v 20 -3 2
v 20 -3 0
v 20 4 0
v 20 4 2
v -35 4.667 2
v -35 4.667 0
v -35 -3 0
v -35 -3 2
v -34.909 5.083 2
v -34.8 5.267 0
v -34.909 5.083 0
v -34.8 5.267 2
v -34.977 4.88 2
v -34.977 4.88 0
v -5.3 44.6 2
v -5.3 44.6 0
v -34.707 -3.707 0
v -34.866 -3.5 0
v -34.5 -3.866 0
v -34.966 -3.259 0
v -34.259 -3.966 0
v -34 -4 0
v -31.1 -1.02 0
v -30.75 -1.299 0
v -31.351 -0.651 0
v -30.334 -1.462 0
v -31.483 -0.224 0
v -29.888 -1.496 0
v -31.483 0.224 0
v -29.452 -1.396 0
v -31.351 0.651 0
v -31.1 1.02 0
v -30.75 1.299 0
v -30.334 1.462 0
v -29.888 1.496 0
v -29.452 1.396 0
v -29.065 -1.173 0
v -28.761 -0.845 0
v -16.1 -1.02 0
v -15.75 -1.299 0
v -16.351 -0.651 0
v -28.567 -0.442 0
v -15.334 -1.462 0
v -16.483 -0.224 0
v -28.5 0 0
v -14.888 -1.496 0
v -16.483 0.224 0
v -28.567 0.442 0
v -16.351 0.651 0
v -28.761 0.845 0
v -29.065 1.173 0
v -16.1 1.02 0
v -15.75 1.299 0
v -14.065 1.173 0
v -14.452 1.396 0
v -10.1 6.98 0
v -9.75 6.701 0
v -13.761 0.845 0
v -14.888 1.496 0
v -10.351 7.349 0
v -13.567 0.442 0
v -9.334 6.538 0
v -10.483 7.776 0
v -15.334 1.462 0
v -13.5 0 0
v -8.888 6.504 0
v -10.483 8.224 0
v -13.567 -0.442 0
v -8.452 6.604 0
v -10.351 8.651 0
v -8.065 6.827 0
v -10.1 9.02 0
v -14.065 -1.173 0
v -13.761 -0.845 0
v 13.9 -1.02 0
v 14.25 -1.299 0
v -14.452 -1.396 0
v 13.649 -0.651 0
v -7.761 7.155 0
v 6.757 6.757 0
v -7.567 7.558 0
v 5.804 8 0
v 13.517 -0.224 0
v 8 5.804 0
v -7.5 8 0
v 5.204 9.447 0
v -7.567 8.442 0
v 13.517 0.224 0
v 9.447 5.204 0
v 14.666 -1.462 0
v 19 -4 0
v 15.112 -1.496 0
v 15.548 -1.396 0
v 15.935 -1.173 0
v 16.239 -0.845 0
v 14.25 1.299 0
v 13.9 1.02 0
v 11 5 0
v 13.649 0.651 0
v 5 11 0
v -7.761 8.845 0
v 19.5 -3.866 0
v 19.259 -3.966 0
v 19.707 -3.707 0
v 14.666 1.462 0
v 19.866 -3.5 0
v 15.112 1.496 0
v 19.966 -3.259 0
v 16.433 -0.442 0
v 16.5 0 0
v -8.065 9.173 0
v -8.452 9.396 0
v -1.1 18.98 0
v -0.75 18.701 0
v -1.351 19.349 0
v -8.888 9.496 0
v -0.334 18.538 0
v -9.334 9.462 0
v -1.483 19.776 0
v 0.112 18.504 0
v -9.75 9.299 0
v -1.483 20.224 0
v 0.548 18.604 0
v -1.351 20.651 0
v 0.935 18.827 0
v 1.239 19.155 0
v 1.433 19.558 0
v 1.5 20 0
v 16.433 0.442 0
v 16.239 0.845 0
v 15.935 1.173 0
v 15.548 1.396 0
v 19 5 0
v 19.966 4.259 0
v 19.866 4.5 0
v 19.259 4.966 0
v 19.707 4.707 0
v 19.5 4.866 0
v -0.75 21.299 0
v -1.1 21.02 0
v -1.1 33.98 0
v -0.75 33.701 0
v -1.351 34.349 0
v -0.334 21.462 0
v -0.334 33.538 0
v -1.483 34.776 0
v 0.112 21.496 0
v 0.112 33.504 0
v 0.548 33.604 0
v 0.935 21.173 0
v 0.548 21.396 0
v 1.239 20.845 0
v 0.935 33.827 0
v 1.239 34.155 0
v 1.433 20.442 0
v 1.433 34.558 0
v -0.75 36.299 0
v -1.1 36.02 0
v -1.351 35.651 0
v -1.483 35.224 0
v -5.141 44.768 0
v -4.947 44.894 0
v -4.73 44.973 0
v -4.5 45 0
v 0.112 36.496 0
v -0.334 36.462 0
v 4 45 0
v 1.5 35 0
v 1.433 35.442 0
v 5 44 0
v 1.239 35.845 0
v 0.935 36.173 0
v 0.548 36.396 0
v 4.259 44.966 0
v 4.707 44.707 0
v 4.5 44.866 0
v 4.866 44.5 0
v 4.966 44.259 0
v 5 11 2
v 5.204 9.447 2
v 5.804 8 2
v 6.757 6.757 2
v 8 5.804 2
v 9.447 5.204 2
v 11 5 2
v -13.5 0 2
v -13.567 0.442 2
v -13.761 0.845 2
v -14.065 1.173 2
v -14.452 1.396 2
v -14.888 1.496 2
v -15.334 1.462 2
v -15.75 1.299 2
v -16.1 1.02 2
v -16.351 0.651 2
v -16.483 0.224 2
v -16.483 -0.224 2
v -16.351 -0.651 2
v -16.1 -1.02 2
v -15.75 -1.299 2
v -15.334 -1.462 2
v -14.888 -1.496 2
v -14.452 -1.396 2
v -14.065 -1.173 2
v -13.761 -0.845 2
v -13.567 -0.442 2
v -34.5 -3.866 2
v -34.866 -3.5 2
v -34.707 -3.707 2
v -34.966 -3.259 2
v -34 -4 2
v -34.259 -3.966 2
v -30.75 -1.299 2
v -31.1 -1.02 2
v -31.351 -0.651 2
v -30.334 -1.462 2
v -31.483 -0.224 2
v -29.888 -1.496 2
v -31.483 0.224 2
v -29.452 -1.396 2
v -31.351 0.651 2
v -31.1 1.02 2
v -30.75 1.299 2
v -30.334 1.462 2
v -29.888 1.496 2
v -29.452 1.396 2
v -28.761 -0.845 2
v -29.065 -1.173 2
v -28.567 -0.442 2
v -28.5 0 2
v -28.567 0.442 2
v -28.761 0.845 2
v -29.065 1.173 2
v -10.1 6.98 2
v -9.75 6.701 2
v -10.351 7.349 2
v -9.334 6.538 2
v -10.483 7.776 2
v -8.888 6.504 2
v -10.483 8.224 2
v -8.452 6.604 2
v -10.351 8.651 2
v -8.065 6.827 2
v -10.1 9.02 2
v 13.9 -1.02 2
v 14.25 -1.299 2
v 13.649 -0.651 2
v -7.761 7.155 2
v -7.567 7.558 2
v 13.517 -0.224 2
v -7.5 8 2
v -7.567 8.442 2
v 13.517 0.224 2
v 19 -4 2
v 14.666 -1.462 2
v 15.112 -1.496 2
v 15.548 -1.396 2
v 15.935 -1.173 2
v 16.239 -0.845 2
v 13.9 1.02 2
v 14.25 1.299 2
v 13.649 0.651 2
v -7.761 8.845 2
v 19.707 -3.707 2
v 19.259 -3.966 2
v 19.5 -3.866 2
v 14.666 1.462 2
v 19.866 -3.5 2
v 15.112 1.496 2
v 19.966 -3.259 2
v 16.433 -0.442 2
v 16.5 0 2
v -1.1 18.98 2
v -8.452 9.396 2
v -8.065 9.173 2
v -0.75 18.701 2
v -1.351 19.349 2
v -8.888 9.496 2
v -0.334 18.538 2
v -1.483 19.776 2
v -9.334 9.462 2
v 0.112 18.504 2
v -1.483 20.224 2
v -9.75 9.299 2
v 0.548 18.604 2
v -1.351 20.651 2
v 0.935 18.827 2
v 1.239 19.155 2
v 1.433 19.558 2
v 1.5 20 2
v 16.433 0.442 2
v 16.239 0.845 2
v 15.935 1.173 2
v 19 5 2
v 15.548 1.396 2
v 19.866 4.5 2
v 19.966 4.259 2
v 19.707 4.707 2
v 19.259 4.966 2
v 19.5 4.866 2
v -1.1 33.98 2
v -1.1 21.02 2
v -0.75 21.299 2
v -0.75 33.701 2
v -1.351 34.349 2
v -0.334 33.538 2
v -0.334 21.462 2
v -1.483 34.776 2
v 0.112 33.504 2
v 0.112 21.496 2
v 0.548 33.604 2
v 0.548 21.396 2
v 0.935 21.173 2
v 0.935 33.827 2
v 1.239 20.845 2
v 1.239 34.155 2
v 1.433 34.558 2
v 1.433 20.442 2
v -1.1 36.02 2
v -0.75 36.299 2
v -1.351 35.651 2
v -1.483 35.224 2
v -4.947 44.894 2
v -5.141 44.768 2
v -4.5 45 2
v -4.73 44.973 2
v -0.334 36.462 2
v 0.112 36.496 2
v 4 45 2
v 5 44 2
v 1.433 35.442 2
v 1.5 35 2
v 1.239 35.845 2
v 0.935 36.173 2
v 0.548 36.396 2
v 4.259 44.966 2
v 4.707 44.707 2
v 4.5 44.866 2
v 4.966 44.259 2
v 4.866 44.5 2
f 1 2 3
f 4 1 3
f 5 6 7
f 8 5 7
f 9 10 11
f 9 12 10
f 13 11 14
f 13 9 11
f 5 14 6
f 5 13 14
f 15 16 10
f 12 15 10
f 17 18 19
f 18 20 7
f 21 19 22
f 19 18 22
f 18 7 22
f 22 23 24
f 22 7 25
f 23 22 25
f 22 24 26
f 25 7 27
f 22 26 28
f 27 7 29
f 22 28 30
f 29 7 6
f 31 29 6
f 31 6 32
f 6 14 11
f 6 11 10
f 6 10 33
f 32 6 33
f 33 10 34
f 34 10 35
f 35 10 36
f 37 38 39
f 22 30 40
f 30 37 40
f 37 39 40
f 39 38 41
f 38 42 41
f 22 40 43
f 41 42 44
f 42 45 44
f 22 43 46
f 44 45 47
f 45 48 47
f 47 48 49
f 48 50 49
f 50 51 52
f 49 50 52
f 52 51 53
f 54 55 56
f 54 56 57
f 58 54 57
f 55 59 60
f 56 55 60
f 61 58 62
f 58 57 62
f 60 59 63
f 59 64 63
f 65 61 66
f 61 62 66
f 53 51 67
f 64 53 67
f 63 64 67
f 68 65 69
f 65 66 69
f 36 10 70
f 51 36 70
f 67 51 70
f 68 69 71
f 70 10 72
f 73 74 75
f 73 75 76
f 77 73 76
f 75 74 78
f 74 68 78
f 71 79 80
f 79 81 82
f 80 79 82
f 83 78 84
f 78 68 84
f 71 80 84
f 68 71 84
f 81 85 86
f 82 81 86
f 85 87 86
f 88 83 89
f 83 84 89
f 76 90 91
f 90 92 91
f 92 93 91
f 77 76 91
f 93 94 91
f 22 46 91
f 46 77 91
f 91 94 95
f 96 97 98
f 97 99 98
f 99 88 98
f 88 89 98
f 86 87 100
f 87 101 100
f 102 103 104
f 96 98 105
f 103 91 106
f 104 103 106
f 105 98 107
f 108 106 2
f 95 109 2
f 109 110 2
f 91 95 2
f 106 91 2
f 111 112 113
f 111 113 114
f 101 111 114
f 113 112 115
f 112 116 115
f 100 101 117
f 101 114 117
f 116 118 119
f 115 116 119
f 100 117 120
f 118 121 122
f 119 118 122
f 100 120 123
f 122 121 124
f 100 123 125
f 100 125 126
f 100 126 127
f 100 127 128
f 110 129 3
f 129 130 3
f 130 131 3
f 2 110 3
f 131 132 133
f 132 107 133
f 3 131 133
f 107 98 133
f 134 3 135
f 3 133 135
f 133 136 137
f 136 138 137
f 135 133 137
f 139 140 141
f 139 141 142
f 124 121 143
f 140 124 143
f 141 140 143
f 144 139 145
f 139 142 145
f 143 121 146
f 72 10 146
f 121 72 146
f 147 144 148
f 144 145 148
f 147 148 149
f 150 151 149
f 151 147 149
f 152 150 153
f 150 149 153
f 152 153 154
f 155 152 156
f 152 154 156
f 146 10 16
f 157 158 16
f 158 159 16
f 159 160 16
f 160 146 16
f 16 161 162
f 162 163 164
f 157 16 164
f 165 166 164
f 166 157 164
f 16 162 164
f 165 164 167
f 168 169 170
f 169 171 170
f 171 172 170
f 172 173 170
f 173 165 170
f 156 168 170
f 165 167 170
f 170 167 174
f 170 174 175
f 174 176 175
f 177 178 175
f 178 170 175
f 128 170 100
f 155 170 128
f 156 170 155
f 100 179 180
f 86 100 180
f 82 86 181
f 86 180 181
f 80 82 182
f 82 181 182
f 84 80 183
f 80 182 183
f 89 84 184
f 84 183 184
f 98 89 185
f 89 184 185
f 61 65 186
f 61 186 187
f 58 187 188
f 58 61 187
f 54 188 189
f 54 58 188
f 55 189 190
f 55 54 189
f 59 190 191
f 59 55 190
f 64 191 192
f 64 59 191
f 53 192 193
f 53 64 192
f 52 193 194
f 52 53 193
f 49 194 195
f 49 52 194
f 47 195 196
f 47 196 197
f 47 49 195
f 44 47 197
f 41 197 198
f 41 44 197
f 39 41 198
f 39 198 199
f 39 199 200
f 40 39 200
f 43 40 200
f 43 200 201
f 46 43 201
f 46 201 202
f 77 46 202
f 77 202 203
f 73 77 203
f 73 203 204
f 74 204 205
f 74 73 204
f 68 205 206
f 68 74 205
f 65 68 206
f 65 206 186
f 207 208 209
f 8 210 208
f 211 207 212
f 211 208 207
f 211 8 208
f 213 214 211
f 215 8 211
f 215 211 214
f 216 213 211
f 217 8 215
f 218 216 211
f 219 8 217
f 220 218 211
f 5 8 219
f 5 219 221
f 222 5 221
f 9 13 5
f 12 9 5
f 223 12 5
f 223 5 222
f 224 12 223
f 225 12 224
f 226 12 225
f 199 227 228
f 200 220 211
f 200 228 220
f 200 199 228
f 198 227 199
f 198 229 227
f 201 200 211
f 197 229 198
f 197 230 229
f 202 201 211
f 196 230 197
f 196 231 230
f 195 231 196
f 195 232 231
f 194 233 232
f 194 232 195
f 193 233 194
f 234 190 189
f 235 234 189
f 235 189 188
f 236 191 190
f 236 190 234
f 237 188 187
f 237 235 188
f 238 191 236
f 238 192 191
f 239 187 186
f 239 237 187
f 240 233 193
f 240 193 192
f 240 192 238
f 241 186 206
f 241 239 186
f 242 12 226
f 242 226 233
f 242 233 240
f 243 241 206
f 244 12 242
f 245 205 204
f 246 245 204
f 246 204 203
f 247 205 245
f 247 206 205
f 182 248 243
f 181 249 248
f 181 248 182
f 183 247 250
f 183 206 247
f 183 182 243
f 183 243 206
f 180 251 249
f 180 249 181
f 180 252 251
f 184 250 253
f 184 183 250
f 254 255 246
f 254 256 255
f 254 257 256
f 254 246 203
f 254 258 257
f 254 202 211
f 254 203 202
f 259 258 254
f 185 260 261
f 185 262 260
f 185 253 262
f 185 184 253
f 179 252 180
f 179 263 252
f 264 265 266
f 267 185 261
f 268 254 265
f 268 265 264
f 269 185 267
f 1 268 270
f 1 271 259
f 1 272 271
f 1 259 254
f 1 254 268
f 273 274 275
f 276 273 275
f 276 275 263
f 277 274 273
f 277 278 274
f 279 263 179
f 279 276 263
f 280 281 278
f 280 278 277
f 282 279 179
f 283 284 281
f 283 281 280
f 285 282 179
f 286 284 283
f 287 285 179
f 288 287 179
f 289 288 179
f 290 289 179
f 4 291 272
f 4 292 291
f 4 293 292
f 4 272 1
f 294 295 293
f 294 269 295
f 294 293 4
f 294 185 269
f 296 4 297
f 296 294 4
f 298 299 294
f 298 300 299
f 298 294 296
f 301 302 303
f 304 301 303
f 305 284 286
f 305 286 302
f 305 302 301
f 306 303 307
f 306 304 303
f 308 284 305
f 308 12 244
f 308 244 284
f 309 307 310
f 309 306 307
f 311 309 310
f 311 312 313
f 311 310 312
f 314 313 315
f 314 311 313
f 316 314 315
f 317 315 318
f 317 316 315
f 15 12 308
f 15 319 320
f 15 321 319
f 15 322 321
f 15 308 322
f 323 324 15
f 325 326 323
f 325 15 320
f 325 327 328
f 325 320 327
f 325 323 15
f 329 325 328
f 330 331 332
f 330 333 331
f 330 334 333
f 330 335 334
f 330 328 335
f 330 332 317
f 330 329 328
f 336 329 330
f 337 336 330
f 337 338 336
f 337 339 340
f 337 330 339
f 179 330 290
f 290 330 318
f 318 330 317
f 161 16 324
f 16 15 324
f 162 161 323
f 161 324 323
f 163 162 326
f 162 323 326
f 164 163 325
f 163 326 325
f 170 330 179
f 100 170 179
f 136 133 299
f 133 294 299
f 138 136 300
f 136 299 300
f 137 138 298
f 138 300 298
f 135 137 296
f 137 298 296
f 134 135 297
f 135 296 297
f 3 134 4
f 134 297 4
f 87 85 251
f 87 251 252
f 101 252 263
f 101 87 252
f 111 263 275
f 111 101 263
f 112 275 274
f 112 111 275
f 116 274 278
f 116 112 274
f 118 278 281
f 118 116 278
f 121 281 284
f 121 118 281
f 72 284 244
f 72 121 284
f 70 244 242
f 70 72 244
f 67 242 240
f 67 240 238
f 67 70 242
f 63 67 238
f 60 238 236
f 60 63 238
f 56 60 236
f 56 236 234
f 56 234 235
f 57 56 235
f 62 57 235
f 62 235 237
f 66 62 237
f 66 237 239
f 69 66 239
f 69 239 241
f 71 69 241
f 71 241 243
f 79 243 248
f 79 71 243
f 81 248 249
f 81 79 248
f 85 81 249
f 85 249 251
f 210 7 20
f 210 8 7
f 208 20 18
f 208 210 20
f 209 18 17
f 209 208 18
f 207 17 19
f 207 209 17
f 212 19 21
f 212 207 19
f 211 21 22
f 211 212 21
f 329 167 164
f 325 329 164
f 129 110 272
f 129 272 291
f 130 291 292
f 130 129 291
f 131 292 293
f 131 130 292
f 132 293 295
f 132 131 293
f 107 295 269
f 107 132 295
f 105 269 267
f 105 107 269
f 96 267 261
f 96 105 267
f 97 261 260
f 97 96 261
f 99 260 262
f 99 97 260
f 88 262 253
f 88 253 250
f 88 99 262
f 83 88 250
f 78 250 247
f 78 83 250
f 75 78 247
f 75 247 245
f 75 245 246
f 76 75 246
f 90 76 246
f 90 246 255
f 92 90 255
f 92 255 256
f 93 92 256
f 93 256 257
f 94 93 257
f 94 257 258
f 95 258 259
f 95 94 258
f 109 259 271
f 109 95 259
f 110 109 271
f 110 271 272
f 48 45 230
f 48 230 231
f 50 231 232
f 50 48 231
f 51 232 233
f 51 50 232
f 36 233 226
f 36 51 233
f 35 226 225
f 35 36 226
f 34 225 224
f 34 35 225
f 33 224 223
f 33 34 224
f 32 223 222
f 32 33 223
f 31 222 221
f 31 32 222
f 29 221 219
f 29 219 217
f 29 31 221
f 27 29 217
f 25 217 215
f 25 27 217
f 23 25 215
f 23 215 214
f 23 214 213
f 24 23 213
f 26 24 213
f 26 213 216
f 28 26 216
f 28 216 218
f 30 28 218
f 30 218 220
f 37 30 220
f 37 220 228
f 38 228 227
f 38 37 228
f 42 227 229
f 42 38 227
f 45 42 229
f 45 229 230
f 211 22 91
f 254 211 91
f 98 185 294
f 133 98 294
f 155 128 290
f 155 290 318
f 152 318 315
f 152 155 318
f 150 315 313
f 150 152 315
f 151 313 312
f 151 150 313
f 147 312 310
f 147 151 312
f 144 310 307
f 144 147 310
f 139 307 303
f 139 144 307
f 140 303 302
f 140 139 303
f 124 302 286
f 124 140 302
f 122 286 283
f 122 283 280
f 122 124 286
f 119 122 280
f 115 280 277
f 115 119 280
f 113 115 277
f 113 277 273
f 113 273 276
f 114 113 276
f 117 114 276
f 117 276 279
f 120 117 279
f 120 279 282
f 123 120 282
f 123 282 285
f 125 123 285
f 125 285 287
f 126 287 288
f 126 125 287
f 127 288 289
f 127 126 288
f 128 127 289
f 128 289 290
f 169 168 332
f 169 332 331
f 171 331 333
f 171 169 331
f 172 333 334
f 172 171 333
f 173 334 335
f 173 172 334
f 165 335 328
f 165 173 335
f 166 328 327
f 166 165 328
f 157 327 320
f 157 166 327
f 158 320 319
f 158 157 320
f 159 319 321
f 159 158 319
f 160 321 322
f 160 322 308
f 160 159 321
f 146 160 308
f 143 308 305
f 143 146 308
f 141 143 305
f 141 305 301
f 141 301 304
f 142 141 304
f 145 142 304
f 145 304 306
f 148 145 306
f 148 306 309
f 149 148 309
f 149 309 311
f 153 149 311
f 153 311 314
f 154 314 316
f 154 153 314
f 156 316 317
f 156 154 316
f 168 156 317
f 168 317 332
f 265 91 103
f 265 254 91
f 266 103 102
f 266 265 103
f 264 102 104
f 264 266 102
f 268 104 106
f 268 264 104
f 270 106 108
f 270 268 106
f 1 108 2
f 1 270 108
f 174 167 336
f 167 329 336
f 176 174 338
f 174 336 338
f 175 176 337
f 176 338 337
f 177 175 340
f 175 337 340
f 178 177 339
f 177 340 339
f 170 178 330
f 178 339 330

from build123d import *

# Parameters (mm, degrees)
SKETCH_1_R          = 1.5
EXTRUDE_1_DEPTH     = 2
CUT_EXTRUDE_1_DEPTH = 10
FILLET_1_R          = 1


with BuildPart() as part:
    # 草图1 → 凸台-拉伸1 (new body)
    with BuildSketch(Plane.XY):
        Polygon((-5, 45), (-35, 5), (-35, -4), (20, -4), (20, 5), (5, 45), align=None)
        with Locations((-30, 0)):
            Circle(SKETCH_1_R, mode=Mode.SUBTRACT)
        with Locations((-15, 0)):
            Circle(SKETCH_1_R, mode=Mode.SUBTRACT)
        with Locations((-9, 8)):
            Circle(SKETCH_1_R, mode=Mode.SUBTRACT)
        with Locations((15, 0)):
            Circle(SKETCH_1_R, mode=Mode.SUBTRACT)
        with Locations((0, 20)):
            Circle(SKETCH_1_R, mode=Mode.SUBTRACT)
        with Locations((0, 35)):
            Circle(SKETCH_1_R, mode=Mode.SUBTRACT)
    extrude(amount=EXTRUDE_1_DEPTH)

    # 草图2 → 切除-拉伸1 (cut)
    with BuildSketch(Plane.XY.offset(2)):
        with BuildLine():
            Line((5, 45), (5, 11))
            ThreePointArc((5, 11), (6.757359313, 6.757359313), (11, 5))
            Line((11, 5), (20, 5))
            Line((20, 5), (5, 45))
        make_face()
    extrude(amount=-CUT_EXTRUDE_1_DEPTH, mode=Mode.SUBTRACT)

    # 圆角1
    fillet_1_edges = [part.edges().sort_by_distance(p)[0] for p in [
        (20, -4, 1),
        (-35, -4, 1),
        (-35, 5, 1),
        (-5, 45, 1),
        (5, 45, 1),
        (20, 5, 1),
    ]]
    fillet(fillet_1_edges, radius=FILLET_1_R)


solid = part.part
